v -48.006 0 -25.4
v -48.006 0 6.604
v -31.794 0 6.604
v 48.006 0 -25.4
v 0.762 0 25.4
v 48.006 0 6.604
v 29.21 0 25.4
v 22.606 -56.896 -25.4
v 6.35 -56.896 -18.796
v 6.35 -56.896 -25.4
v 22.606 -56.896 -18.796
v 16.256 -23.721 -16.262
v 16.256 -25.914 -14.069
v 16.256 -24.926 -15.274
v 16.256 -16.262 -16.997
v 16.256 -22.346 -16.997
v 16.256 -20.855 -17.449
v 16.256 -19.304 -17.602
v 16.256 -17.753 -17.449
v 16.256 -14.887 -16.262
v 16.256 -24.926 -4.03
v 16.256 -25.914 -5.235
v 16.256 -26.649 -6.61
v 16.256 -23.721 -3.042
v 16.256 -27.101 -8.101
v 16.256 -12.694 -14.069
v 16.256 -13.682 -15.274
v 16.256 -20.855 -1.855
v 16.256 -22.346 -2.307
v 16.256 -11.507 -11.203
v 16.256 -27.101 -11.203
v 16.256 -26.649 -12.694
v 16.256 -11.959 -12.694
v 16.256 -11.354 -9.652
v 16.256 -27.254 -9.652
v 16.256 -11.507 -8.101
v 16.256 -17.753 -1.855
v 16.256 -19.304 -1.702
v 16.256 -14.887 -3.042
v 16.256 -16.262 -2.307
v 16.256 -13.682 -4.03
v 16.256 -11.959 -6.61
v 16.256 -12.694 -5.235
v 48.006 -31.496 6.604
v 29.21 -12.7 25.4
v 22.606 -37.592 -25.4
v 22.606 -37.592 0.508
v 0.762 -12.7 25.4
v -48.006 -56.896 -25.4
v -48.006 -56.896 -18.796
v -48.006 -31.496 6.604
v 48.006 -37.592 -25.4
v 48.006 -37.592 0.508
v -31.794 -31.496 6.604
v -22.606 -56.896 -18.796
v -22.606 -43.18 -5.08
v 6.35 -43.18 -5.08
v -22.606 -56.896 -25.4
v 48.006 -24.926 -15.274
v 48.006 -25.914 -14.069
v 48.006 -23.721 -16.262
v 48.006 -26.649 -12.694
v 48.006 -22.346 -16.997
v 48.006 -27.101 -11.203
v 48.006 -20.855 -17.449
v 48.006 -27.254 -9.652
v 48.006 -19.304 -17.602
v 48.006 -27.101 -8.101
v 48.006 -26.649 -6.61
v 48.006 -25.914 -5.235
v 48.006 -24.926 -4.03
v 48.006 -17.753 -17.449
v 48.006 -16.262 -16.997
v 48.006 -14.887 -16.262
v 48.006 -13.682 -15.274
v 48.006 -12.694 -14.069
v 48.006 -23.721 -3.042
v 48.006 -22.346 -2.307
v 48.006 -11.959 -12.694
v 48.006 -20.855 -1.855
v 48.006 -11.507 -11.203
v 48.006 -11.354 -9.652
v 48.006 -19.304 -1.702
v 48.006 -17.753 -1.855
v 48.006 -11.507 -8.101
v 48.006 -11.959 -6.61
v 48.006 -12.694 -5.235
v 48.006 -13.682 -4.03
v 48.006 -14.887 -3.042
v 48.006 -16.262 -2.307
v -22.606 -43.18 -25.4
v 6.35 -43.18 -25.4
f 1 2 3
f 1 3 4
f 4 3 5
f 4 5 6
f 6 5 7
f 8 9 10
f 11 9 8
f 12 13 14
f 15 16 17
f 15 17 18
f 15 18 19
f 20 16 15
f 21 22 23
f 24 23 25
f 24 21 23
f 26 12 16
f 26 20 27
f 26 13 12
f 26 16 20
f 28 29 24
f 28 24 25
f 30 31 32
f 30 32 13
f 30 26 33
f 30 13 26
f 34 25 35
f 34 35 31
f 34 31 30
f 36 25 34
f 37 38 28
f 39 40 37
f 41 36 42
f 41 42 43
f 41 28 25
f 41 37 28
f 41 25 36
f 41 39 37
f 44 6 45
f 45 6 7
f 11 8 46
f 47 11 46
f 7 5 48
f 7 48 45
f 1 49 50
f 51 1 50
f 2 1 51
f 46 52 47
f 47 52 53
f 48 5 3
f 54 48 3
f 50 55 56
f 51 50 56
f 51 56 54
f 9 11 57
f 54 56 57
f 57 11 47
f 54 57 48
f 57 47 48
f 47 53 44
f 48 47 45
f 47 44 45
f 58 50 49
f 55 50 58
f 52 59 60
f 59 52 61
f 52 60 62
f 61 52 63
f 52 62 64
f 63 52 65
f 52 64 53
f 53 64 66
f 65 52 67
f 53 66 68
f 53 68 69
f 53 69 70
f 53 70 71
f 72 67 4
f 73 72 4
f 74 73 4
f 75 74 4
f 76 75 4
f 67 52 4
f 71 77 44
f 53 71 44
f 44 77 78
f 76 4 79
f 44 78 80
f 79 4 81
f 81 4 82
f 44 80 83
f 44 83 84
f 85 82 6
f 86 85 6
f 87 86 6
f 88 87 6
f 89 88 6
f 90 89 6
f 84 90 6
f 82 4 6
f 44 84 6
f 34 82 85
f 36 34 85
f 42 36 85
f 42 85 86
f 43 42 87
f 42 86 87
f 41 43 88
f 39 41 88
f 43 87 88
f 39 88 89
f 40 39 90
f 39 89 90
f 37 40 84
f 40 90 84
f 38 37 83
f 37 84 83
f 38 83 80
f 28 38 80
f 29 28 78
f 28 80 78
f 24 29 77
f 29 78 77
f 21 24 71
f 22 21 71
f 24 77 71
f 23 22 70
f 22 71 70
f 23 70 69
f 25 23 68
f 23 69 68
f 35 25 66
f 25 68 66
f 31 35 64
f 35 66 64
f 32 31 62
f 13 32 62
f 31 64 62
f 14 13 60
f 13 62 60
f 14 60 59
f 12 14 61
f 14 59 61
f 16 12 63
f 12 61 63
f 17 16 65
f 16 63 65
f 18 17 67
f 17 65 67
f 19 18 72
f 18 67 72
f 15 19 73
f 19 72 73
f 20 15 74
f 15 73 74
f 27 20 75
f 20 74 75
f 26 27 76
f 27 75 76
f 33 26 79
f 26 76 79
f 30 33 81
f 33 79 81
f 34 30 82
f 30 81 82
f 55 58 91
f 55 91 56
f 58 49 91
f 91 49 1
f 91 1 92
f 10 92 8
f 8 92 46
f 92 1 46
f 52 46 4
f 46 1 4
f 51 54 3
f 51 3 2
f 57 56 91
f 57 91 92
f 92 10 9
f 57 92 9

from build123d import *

# Parameters (mm, degrees)
F0_W      = 96.012
F0_H      = 50.8
F1_DEPTH  = 56.896
F3_DEPTH  = 96.013
F4_W      = 28.956
F4_H      = 31.024452
F5_DEPTH  = 13.716
F6_W      = 25.4
F6_H      = 25.4
F7_DEPTH  = 19.304
F8_R      = 7.9502
F9_DEPTH  = 31.75
F11_DEPTH = 25.4
F13_DEPTH = 56.897
F15_DEPTH = 56.897


with BuildPart() as f1:
    # F0 (on Front) → F1 (new body)
    with BuildSketch(Plane.XZ):
        Rectangle(F0_W, F0_H)
    extrude(amount=F1_DEPTH)

    # F2 (on face) → F3 (cut, through all)
    with BuildSketch(Plane.YZ.offset(48.006)):
        Polygon((-56.896, -18.796), (-12.7, 25.4), (-56.896, 25.4), align=None)
    extrude(amount=-F3_DEPTH, mode=Mode.SUBTRACT)

    # F4 (on face) → F5 (cut)
    with BuildSketch(Plane.XZ.offset(56.896)):
        with Locations((-8.128, -9.887774)):
            Rectangle(F4_W, F4_H)
    extrude(amount=-F5_DEPTH, mode=Mode.SUBTRACT)

    # F6 (on face) → F7 (cut)
    with BuildSketch(Plane.XZ.offset(56.896)):
        with Locations((35.306, -12.7)):
            Rectangle(F6_W, F6_H)
    extrude(amount=-F7_DEPTH, mode=Mode.SUBTRACT)

    # F8 (on face) → F9 (cut)
    with BuildSketch(Plane.YZ.offset(48.006)):
        with Locations((-19.304, -9.652)):
            Circle(F8_R)
    extrude(amount=-F9_DEPTH, mode=Mode.SUBTRACT)

    # F10 (on face) → F11 (cut)
    with BuildSketch(Plane.YZ.offset(48.006)):
        Polygon((-38.1, 0), (-37.592, 0), (-37.592, 0.508), align=None)
    extrude(amount=-F11_DEPTH, mode=Mode.SUBTRACT)

    # F12 (on face) → F13 (cut, through all)
    with BuildSketch(Plane(origin=(0, 0, 0), x_dir=(-1, 0, 0), z_dir=(0, 1, 0))):
        Polygon((-29.21, 25.4), (-48.006, 25.4), (-48.006, 6.604), align=None)
    extrude(amount=-F13_DEPTH, mode=Mode.SUBTRACT)

    # F14 (on face) → F15 (cut, through all)
    with BuildSketch(Plane(origin=(0, 0, 0), x_dir=(-1, 0, 0), z_dir=(0, 1, 0))):
        Polygon((48.006, 25.4), (-0.762, 25.4), (31.793627, 6.604), (48.006, 6.604), align=None)
    extrude(amount=-F15_DEPTH, mode=Mode.SUBTRACT)


solid = f1.part
